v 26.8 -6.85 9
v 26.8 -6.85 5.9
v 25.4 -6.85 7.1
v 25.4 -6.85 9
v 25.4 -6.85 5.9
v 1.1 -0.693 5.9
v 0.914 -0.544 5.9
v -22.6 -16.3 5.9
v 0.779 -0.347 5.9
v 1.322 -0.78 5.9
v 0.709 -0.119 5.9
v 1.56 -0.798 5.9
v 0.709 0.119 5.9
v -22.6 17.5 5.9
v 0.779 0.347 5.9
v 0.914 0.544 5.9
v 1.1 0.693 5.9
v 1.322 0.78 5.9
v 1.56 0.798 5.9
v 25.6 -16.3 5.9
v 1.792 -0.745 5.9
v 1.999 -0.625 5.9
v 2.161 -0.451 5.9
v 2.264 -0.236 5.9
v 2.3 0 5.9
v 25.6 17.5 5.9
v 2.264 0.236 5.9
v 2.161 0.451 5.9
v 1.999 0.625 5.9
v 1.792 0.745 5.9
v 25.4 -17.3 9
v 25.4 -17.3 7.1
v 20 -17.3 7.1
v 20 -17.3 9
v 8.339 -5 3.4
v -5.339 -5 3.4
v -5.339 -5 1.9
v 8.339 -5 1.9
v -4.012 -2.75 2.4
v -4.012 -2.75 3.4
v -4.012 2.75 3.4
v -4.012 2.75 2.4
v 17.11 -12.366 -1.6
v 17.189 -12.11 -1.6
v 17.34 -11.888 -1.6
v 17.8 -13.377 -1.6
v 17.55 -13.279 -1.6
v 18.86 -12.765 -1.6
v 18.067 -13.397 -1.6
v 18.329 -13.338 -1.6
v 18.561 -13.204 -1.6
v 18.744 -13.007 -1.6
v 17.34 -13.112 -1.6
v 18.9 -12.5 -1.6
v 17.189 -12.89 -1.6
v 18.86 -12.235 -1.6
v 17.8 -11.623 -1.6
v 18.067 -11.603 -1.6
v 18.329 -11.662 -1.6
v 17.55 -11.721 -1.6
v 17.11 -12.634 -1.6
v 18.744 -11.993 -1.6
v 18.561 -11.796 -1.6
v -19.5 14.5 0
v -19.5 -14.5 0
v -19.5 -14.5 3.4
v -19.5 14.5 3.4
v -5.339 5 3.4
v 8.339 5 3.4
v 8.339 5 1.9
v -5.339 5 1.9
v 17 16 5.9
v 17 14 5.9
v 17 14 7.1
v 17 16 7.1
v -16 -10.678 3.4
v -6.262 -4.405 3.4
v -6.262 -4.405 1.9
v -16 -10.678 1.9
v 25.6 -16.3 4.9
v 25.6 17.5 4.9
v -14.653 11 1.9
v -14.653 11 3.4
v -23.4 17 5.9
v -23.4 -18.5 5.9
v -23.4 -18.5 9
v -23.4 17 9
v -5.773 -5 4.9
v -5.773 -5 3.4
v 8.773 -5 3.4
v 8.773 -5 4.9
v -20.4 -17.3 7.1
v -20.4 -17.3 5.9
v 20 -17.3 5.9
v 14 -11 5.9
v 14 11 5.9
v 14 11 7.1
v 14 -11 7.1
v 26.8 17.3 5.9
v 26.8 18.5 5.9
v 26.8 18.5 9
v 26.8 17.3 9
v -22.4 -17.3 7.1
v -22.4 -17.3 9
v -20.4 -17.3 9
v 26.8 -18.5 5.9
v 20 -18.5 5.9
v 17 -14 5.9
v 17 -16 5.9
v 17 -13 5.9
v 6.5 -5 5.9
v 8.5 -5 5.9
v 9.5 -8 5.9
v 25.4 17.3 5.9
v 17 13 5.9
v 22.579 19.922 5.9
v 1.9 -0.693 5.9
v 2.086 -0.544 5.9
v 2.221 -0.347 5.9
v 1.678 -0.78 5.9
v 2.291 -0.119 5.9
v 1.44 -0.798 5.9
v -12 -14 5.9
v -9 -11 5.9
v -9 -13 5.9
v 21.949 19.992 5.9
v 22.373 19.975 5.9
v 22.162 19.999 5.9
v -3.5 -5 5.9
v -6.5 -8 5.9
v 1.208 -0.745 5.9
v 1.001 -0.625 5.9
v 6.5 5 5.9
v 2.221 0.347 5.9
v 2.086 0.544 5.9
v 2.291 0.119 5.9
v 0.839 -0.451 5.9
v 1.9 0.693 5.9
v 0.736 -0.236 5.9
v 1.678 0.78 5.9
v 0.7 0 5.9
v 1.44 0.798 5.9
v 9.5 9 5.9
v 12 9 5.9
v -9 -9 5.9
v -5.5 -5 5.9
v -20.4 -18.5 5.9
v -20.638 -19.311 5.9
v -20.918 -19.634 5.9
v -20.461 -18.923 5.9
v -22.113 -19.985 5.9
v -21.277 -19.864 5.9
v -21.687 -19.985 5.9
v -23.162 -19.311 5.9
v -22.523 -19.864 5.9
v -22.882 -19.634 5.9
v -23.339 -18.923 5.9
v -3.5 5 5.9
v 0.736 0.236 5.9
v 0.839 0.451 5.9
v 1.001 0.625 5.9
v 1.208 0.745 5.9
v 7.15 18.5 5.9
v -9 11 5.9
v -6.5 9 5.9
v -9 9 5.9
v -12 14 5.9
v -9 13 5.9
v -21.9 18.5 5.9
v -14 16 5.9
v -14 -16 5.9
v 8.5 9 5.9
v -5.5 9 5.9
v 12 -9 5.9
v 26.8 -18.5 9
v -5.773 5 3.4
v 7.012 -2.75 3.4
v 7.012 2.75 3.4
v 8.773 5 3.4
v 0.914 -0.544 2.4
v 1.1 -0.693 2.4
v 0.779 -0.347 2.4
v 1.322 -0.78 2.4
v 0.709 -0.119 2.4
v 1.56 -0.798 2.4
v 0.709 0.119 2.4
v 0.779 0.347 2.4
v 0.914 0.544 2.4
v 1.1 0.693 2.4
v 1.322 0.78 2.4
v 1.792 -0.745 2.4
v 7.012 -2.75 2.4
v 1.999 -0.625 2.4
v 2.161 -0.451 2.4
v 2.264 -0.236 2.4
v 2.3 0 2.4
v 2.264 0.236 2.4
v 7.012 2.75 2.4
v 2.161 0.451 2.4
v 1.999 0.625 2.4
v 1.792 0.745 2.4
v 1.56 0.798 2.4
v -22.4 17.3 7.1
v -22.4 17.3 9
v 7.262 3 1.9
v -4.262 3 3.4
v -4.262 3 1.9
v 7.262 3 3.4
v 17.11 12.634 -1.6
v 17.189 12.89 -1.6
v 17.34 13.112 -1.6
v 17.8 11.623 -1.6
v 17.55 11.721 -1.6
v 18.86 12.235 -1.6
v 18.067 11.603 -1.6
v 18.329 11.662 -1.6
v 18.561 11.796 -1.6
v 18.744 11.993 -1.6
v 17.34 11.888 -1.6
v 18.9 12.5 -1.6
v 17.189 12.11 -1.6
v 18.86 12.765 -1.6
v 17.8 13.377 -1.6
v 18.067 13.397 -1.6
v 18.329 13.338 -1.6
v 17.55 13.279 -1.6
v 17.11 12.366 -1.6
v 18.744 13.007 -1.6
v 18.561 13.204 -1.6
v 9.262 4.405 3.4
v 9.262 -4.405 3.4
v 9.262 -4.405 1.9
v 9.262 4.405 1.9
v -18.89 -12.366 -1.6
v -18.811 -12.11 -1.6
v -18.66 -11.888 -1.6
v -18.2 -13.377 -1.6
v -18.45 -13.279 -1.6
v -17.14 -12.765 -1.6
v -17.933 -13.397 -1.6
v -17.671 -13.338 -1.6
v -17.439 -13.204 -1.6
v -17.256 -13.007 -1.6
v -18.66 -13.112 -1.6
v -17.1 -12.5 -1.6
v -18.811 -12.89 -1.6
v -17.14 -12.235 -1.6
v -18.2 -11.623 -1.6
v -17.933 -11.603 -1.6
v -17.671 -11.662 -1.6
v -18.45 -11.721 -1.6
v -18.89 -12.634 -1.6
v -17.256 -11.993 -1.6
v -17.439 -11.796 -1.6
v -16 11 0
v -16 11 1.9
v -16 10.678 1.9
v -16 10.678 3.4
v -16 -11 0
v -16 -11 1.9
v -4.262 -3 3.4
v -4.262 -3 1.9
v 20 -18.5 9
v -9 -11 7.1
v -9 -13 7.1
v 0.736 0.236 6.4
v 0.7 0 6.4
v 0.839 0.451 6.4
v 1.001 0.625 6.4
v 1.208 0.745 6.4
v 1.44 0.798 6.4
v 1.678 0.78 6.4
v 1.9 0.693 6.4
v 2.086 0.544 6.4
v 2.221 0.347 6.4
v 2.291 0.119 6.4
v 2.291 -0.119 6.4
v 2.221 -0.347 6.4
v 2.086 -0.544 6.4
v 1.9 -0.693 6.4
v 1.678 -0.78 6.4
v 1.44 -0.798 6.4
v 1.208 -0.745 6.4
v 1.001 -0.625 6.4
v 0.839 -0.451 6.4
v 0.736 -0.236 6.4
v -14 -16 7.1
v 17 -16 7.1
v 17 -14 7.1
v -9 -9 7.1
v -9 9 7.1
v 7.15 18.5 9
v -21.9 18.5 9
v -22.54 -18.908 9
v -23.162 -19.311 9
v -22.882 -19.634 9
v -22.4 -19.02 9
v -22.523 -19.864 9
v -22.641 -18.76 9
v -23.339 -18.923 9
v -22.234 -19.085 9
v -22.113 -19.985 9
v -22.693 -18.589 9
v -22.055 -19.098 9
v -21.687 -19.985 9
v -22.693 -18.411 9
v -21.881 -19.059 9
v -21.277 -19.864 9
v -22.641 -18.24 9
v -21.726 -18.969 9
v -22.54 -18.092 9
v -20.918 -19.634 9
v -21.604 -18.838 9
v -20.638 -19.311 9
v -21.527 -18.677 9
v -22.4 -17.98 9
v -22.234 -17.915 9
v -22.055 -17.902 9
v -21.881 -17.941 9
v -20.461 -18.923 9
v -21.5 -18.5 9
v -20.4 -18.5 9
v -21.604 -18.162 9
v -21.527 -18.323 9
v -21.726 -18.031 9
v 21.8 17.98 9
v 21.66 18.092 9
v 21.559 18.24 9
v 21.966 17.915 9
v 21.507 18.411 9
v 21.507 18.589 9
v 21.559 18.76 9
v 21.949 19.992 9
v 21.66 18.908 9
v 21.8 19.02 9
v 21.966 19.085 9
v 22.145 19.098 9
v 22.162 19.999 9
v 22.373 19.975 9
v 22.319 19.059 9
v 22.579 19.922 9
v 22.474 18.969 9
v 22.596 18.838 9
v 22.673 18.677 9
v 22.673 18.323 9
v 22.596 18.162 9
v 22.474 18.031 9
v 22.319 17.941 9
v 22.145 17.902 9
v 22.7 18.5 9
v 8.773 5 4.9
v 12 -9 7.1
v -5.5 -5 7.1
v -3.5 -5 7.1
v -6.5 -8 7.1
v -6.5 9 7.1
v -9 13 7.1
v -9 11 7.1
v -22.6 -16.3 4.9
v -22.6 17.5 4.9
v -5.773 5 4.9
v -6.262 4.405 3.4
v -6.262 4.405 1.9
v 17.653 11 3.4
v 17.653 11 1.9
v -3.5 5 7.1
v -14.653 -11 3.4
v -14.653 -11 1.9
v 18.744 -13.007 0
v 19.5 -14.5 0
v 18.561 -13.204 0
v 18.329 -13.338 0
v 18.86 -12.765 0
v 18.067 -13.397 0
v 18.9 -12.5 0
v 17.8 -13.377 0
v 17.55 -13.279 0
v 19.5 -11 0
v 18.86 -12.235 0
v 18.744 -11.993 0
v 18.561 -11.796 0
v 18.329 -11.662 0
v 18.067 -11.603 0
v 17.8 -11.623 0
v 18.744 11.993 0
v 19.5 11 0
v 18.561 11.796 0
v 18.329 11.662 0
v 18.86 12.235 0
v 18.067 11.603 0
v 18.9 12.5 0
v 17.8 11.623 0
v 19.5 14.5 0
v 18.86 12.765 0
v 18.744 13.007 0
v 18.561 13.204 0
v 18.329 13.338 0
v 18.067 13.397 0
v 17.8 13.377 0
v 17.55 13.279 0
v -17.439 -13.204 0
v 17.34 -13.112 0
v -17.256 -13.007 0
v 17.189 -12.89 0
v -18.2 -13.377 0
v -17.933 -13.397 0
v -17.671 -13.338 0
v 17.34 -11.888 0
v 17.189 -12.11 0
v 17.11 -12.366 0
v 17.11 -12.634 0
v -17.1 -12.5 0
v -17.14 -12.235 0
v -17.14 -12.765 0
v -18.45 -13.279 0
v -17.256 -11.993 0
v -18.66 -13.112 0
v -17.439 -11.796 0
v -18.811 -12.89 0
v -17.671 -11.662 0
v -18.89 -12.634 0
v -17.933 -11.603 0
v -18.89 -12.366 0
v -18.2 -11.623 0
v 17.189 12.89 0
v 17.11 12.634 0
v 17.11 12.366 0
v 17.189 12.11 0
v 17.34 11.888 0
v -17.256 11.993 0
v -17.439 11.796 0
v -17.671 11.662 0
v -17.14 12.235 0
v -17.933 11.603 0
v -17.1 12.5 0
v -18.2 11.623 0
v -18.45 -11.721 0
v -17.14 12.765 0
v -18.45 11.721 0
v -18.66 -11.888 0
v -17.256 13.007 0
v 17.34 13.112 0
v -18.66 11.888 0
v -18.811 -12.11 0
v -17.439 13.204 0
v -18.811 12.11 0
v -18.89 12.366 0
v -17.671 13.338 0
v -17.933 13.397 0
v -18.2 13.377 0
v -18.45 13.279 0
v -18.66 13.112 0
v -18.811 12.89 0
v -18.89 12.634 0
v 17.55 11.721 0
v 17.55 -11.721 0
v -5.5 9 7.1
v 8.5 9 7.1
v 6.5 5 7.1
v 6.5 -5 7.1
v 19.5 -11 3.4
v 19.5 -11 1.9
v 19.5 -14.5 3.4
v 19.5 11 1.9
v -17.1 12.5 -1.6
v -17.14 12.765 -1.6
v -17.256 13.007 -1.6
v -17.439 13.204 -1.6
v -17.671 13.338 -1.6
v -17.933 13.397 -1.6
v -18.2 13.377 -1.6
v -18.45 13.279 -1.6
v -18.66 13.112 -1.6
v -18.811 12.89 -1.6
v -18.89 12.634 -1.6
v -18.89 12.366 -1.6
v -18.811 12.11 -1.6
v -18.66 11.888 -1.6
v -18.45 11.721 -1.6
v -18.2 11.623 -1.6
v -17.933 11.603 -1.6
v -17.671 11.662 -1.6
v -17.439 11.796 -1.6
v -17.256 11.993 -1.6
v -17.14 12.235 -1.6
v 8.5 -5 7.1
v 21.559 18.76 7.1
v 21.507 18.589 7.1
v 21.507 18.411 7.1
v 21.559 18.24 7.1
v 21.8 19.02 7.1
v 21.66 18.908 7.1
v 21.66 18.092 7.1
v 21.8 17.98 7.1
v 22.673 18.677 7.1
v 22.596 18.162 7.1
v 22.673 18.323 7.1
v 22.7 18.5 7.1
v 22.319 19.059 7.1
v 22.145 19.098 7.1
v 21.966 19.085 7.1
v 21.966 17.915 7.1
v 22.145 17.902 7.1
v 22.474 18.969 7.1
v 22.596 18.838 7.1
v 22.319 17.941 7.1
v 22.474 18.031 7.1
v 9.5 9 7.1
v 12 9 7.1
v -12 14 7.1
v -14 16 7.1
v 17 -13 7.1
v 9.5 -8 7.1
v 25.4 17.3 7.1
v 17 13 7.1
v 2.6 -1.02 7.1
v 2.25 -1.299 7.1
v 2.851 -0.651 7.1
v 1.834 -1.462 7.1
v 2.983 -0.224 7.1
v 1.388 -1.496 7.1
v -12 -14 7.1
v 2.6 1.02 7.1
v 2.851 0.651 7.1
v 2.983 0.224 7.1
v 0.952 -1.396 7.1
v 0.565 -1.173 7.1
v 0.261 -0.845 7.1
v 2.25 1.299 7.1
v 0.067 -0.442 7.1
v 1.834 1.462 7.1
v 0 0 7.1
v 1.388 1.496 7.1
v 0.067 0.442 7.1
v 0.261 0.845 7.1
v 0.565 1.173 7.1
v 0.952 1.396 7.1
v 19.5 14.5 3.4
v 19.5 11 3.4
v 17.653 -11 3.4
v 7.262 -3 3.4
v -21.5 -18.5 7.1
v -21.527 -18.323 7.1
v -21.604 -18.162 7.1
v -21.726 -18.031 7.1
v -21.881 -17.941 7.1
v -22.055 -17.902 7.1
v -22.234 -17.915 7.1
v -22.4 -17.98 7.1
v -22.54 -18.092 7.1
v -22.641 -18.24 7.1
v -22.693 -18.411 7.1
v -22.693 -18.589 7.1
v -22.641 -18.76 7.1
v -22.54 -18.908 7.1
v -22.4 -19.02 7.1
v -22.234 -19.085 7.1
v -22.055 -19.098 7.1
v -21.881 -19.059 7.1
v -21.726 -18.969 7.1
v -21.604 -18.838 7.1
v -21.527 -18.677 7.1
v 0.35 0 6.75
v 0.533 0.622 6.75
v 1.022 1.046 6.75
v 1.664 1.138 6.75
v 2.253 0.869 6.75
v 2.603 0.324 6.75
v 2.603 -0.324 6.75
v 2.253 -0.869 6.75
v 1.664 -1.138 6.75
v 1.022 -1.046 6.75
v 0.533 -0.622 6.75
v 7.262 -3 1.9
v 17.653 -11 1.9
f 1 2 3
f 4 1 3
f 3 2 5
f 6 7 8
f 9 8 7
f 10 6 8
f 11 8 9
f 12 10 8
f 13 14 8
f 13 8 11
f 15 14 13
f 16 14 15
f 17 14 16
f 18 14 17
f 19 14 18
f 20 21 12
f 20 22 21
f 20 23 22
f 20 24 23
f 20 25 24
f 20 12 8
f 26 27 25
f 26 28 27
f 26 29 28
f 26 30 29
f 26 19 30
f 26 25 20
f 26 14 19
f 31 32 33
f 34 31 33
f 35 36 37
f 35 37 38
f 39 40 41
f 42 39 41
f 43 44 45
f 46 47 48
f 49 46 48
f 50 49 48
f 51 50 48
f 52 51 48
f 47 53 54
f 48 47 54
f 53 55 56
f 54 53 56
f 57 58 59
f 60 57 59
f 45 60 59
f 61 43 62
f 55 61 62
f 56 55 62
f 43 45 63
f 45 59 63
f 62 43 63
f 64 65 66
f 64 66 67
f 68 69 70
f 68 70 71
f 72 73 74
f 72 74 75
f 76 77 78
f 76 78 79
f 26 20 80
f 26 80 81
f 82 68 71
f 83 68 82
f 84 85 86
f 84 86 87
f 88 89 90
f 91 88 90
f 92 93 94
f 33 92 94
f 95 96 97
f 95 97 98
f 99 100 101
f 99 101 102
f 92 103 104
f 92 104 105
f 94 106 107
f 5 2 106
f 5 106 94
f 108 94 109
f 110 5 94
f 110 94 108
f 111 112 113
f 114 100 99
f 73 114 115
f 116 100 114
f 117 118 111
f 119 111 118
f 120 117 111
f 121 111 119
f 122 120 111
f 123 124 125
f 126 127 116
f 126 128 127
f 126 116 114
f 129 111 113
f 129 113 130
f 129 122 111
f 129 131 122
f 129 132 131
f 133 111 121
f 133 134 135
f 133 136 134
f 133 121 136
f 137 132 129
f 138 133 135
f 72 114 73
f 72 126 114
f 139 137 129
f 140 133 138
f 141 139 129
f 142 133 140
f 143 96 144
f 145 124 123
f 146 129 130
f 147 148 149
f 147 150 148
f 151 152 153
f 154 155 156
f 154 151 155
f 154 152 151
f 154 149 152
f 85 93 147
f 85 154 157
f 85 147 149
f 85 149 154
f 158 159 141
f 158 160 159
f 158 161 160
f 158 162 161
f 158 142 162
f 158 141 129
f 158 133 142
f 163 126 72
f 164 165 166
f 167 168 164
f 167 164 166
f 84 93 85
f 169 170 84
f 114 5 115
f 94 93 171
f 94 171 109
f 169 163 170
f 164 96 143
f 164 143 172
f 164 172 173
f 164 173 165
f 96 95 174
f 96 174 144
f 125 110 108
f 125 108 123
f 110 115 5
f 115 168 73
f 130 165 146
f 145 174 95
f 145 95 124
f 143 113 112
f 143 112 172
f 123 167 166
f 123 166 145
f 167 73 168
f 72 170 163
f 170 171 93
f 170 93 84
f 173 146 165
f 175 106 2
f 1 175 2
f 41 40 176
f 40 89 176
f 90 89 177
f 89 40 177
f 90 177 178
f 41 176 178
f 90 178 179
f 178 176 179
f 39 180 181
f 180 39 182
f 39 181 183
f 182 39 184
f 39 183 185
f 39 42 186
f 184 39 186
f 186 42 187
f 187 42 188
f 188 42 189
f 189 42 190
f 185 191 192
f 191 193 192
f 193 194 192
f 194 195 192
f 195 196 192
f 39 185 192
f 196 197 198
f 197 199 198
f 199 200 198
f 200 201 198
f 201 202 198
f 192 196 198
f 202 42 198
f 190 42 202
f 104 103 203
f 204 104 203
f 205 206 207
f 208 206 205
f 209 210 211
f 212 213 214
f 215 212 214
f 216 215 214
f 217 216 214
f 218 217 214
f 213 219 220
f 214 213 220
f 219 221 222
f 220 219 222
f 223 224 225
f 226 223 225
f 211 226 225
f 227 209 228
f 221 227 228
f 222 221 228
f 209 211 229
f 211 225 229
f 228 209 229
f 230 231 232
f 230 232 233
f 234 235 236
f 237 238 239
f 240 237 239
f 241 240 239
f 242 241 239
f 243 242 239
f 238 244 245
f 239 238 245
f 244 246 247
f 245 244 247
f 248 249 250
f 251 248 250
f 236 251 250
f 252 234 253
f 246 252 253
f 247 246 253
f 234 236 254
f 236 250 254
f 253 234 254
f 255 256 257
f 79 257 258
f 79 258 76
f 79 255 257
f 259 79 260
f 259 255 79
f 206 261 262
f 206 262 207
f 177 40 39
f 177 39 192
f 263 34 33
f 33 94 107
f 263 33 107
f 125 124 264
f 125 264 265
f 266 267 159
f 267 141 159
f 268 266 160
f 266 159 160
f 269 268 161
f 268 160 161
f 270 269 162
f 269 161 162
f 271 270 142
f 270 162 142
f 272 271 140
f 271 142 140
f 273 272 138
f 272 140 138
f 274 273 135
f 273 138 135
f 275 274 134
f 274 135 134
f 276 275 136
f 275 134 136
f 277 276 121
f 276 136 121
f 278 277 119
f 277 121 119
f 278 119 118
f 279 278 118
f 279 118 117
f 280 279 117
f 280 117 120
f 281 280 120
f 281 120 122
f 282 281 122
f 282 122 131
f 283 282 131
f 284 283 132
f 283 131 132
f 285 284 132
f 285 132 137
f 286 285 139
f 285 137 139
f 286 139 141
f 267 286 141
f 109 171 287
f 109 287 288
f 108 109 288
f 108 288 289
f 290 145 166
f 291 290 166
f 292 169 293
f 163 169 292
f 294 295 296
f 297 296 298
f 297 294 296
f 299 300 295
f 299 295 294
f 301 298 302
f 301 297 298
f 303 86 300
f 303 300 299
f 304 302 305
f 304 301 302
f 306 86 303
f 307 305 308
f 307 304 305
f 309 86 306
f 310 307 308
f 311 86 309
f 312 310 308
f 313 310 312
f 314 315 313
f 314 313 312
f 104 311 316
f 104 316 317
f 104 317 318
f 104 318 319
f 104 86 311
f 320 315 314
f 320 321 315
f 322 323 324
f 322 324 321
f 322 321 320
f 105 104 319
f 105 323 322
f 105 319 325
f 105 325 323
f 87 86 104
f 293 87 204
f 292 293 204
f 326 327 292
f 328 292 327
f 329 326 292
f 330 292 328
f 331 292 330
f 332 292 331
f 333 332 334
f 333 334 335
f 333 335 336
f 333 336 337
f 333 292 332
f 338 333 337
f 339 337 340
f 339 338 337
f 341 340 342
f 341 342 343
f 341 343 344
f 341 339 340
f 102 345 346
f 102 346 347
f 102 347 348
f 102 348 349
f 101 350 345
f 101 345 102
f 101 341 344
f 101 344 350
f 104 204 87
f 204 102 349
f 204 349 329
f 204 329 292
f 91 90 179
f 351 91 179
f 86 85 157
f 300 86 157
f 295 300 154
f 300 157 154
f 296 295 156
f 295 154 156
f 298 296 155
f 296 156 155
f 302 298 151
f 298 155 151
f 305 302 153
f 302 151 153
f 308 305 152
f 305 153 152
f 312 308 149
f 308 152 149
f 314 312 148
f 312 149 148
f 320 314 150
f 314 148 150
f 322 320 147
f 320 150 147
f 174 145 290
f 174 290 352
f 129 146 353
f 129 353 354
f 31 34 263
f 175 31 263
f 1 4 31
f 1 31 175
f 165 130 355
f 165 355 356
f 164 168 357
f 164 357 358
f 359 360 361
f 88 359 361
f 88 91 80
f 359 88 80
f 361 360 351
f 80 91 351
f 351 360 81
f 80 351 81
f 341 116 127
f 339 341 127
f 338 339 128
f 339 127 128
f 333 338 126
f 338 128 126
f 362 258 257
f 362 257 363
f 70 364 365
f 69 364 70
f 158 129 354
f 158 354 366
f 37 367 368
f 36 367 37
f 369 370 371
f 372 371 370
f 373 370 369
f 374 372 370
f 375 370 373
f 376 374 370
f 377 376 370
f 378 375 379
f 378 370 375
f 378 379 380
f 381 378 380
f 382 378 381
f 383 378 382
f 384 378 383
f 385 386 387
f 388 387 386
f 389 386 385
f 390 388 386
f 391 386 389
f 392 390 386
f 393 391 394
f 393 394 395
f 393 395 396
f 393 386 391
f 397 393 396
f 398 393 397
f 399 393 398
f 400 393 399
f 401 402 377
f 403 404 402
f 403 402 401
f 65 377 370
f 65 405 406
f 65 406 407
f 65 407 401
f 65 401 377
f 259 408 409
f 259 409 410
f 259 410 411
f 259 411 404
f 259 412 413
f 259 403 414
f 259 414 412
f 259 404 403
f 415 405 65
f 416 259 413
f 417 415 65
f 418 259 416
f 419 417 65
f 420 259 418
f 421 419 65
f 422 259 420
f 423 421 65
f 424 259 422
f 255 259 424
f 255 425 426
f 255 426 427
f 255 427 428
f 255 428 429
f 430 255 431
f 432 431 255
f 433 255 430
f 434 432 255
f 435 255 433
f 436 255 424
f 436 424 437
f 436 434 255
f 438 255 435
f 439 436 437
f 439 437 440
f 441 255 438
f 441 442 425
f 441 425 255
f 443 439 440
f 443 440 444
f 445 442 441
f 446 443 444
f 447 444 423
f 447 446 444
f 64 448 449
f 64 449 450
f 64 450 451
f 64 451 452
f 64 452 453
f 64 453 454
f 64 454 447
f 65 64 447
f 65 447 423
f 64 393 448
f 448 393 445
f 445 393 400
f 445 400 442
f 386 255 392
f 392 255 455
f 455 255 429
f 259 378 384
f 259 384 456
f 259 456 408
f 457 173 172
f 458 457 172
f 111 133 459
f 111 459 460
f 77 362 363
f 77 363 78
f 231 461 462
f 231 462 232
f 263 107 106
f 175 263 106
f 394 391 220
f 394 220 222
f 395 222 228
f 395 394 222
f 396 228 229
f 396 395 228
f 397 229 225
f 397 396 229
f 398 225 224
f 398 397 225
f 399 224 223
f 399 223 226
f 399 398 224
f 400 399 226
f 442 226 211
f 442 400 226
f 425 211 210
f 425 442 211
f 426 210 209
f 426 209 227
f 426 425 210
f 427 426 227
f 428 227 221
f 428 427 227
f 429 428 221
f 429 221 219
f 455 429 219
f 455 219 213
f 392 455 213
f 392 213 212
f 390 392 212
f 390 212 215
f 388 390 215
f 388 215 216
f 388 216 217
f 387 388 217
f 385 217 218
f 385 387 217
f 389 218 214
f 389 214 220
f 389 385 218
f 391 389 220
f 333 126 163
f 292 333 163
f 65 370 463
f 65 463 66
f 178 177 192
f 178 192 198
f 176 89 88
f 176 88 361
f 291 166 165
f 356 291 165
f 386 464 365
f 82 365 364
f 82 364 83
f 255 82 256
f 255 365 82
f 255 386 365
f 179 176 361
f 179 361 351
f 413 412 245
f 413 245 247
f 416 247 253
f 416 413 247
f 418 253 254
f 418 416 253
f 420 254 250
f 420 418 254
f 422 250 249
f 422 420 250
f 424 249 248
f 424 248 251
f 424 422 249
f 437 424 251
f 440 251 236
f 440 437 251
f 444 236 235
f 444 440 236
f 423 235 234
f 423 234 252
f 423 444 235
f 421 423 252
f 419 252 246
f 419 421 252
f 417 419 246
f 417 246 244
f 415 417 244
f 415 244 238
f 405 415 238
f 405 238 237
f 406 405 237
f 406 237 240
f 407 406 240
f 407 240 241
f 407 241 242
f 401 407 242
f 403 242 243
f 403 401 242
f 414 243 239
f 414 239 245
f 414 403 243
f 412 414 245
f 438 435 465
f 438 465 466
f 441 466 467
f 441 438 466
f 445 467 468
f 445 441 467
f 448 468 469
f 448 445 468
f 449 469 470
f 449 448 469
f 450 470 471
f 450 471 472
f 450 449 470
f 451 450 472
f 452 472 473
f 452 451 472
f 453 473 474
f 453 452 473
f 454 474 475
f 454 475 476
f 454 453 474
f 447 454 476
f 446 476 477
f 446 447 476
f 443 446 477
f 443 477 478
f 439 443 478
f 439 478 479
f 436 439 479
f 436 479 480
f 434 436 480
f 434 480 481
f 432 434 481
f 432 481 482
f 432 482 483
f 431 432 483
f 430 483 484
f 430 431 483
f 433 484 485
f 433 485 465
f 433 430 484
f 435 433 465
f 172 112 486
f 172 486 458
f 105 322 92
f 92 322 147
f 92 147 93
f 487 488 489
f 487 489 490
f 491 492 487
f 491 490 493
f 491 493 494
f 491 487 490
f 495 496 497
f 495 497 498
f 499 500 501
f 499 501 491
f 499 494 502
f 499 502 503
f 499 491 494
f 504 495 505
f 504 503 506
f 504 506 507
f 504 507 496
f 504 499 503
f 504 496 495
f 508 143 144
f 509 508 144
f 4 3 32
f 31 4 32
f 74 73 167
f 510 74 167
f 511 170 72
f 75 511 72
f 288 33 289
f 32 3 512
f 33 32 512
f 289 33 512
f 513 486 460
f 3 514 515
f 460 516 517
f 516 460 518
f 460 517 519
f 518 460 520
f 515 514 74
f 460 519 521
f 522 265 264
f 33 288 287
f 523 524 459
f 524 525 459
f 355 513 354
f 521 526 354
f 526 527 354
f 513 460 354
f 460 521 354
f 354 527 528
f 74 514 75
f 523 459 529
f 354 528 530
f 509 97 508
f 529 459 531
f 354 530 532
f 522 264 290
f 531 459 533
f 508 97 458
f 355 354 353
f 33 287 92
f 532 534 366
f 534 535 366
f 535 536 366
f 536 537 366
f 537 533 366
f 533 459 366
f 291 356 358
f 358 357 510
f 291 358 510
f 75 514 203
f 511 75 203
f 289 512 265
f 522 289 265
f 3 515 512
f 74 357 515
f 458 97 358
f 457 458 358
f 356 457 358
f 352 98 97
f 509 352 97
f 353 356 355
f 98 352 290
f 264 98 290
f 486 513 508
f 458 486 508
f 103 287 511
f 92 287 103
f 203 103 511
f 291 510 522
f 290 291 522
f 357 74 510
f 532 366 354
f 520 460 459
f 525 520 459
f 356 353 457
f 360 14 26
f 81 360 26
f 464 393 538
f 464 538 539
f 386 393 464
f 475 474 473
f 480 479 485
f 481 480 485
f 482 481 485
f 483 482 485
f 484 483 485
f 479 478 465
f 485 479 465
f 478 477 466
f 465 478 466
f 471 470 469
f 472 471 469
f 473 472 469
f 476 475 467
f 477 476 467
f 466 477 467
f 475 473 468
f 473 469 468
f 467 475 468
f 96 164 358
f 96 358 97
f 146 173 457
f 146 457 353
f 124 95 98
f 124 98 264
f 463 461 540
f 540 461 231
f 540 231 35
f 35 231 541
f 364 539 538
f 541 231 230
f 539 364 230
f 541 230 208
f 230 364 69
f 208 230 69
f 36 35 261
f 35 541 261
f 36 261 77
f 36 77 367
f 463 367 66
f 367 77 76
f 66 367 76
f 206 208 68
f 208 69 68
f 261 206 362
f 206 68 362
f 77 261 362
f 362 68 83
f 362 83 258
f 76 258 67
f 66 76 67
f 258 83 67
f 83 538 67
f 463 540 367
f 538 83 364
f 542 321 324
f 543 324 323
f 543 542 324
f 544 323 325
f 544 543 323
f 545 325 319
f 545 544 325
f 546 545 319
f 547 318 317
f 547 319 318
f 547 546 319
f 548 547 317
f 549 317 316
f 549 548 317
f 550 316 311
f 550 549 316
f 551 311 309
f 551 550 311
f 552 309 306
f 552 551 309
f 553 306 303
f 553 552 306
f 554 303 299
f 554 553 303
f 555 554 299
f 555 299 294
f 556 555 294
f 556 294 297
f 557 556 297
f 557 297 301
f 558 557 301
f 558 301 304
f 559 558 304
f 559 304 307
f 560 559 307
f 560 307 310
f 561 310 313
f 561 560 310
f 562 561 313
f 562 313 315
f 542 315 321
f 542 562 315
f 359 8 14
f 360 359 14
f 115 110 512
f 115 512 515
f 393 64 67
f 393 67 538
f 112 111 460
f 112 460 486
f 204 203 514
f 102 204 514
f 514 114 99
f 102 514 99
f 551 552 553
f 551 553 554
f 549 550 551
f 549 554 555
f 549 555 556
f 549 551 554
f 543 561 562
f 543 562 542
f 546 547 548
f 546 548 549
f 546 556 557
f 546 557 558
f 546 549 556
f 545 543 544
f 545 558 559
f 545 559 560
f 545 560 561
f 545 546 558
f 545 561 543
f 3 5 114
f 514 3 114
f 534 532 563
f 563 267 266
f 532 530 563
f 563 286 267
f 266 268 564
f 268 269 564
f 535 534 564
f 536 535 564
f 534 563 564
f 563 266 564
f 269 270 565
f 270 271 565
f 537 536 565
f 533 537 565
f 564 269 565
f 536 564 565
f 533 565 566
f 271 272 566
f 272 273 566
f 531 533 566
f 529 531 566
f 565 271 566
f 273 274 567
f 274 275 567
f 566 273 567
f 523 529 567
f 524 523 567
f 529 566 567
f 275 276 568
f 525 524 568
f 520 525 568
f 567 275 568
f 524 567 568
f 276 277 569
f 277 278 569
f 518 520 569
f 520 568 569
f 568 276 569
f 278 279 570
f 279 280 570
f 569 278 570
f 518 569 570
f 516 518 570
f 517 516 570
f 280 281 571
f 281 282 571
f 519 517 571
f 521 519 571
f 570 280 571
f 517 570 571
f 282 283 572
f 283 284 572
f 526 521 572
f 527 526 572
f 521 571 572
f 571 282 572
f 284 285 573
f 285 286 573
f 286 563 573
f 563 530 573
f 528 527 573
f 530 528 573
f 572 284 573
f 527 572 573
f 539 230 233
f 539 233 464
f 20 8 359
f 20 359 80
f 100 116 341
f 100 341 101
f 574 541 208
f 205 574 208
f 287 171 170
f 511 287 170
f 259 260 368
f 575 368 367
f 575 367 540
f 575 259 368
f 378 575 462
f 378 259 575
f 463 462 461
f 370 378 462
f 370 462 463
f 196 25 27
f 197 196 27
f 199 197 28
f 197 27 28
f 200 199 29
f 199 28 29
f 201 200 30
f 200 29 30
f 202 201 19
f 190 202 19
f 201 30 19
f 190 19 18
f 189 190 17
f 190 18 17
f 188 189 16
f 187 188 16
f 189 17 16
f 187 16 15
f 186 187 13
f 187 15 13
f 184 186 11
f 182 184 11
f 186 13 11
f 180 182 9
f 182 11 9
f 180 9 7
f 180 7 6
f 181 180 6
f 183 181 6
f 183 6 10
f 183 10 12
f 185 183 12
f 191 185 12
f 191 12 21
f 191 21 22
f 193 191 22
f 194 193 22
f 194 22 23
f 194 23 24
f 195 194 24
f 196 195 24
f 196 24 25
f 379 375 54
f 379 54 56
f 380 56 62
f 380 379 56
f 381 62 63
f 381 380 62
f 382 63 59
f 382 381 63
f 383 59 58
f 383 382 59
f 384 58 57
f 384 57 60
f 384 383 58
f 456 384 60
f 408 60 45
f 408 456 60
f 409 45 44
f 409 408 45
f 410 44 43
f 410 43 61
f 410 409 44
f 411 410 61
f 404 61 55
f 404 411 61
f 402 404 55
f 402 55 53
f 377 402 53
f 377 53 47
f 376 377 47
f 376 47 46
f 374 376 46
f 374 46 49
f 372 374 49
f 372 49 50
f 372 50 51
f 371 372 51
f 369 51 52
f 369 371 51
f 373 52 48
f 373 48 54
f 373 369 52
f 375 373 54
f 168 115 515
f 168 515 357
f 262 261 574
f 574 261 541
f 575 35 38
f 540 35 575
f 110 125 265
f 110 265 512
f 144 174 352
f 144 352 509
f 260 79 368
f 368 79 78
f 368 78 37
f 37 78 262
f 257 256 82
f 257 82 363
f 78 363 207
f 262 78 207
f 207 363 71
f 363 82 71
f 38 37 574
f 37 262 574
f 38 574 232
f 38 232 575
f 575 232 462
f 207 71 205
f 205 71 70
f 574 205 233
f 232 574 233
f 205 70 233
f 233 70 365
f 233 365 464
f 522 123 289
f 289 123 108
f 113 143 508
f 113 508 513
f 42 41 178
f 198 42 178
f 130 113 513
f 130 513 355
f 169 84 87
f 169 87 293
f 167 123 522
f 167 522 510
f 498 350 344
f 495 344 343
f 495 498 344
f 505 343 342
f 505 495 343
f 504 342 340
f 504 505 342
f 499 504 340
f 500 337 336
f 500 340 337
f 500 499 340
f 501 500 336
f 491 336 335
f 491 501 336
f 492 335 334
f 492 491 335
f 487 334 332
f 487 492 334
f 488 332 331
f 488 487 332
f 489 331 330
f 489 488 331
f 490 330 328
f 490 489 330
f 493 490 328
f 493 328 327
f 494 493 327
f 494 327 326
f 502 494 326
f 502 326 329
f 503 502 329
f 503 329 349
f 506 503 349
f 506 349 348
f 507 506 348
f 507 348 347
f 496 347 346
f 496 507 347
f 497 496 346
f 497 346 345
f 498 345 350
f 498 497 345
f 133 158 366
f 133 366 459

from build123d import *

# Parameters (mm, degrees)
SKETCH007_W      = 47.8
SKETCH007_H      = 34.6
PAD005_DEPTH     = 1.2
PAD006_DEPTH     = 3.1
SKETCH005_W      = 31
SKETCH005_H      = 32
POCKET002_DEPTH  = 5
SKETCH023_W      = 21
SKETCH023_H      = 18
PAD_DEPTH        = 1.2
PAD015_DEPTH     = 1.2
SKETCH013_R      = 0.6
POCKET_DEPTH     = 5
HOLE_D           = 1.6
HOLE_DEPTH       = 25
HOLE_CSINK_D     = 3
HOLE_CSINK_ANGLE = 90
PAD019_DEPTH     = 3.4
SKETCH_R         = 0.9
PAD020_DEPTH     = 1.6
SKETCH037_W      = 11.524262
SKETCH037_H      = 6
PAD021_DEPTH     = 1.5
SKETCH036_W      = 11.0243
SKETCH036_H      = 5.5
PAD022_DEPTH     = 1
SKETCH038_W      = 14.5455
SKETCH038_H      = 10
PAD023_DEPTH     = 1.8
SKETCH039_W      = 48.2
SKETCH039_H      = 33.8
PAD024_DEPTH     = 1
SKETCH040_R      = 0.8
POCKET007_DEPTH  = 5


with BuildPart() as plastic_tek1_display_interface_top_part:
    # Sketch007 (on DatumPlane) → Pad005 (new body)
    with BuildSketch(Plane.XY.offset(5.9)):
        with Locations((1.5, 0)):
            Rectangle(SKETCH007_W, SKETCH007_H)
    extrude(amount=PAD005_DEPTH)

    # Sketch008 (on DatumPlane) → Pad006 (join)
    with BuildSketch(Plane.XY.offset(5.9)):
        with BuildLine():
            Line((-22.4, -17.3), (-22.4, 17.3))
            Line((-22.4, 17.3), (-17.7, 17.3))
            Line((-17.7, 17.3), (-17.3, 17.3))
            Line((-17.3, 17.3), (17.3, 17.3))
            Line((17.3, 17.3), (17.7, 17.3))
            Line((17.7, 17.3), (25.4, 17.3))
            Line((25.4, 17.3), (26.8, 17.3))
            Line((26.8, 18.5), (26.8, 17.3))
            Line((22.578723, 19.921557), (26.8, 18.5))
            ThreePointArc((22.578723, 19.921557), (22.267893, 19.990574), (21.949498, 19.992431))
            Line((21.949498, 19.992431), (7.15, 18.5))
            Line((-21.9, 18.5), (7.15, 18.5))
            Line((-23.4, 17), (-21.9, 18.5))
            Line((-23.4, -18.5), (-23.4, 17))
            ThreePointArc((-23.4, -18.5), (-21.9, -20), (-20.4, -18.5))
            Line((-20.4, -18.5), (-20.4, -17.3))
            Line((-21.3, -17.3), (-20.4, -17.3))
            Line((-21.7, -17.3), (-21.3, -17.3))
            Line((-22.4, -17.3), (-21.7, -17.3))
        make_face()
        Polygon((20, -18.5), (26.8, -18.5), (26.8, -6.85), (25.4, -6.85), (25.4, -17.3), (21.7, -17.3), (21.3, -17.3), (20, -17.3), align=None)
    extrude(amount=PAD006_DEPTH)

    # Sketch005 (on DatumPlane) → Pocket002 (cut)
    with BuildSketch(Plane.XY.offset(5.9)):
        with Locations((1.5, 0)):
            Rectangle(SKETCH005_W, SKETCH005_H)
    extrude(amount=POCKET002_DEPTH, mode=Mode.SUBTRACT)

    # Sketch023 (on DatumPlane) → Pad (join)
    with BuildSketch(Plane.XY.offset(5.9)):
        Polygon((-12, -14), (-12, 14), (-9, 14), (17, 14), (17, 13), (-9, 13), (-9, 11), (14, 11), (14, -11), (-9, -11), (-9, -13), (17, -13), (17, -14), (-9, -14), align=None)
        with Locations((1.5, 0)):
            Rectangle(SKETCH023_W, SKETCH023_H, mode=Mode.SUBTRACT)
    extrude(amount=PAD_DEPTH)

    # Sketch020 (on DatumPlane) → Pad015 (join)
    with BuildSketch(Plane.XY.offset(5.9)):
        Polygon((-3.5, -5), (-3.5, 5), (6.5, 5), (6.5, -5), (8.5, -5), (8.5, 10), (9.5, 10), (9.5, -8), (-6.5, -8), (-6.5, 10), (-5.5, 10), (-5.5, -5), align=None)
    extrude(amount=PAD015_DEPTH)

    # Sketch013 (on DatumPlane) → Pocket (cut)
    with BuildSketch(Plane.XY.offset(7.1)):
        with Locations((22.1, 18.5)):
            Circle(SKETCH013_R)
        with Locations((-22.1, -18.5)):
            Circle(SKETCH013_R)
    extrude(amount=POCKET_DEPTH, mode=Mode.SUBTRACT)

    # Hole
    with Locations(Plane.XY.offset(7.1)):
        with Locations((1.5, 0)):
            CounterSinkHole(HOLE_D / 2, HOLE_CSINK_D / 2, depth=HOLE_DEPTH, counter_sink_angle=HOLE_CSINK_ANGLE)


with BuildPart() as body002:
    # Sketch029 → Pad019 (new body)
    with BuildSketch(Plane.XY):
        Polygon((-19.5, -14.5), (-19.5, 14.5), (19.5, 14.5), (19.5, 11), (-16, 11), (-16, -11), (19.5, -11), (19.5, -14.5), align=None)
    extrude(amount=PAD019_DEPTH)

    # Sketch → Pad020 (join)
    with BuildSketch(Plane.XY):
        with Locations((-18, 12.5)):
            Circle(SKETCH_R)
        with Locations((-18, -12.5)):
            Circle(SKETCH_R)
        with Locations((18, -12.5)):
            Circle(SKETCH_R)
        with Locations((18, 12.5)):
            Circle(SKETCH_R)
    extrude(amount=-PAD020_DEPTH)

    # Sketch037 (on DatumPlane) → Pad021 (join)
    with BuildSketch(Plane.XY.offset(3.4)):
        Polygon((-16.5, 11), (-6.262131, 4.405245), (-6.262131, -4.405245), (-16.5, -11), (-14.653374, -11), (-5.338818, -5), (8.338818, -5), (17.653374, -11), (19.5, -11), (9.262131, -4.405245), (9.262131, 4.405245), (19.5, 11), (17.653374, 11), (8.338818, 5), (-5.338818, 5), (-14.653374, 11), align=None)
        with Locations((1.5, 0)):
            Rectangle(SKETCH037_W, SKETCH037_H, mode=Mode.SUBTRACT)
    extrude(amount=-PAD021_DEPTH)


with BuildPart() as body:
    # Sketch036 (on DatumPlane) → Pad022 (new body)
    with BuildSketch(Plane.XY.offset(3.4)):
        with Locations((1.5, 0)):
            Rectangle(SKETCH036_W, SKETCH036_H)
    extrude(amount=-PAD022_DEPTH)

    # Sketch038 (on DatumPlane) → Pad023 (join)
    with BuildSketch(Plane.XY.offset(3.4)):
        with Locations((1.5, 0)):
            Rectangle(SKETCH038_W, SKETCH038_H)
    extrude(amount=PAD023_DEPTH)

    # Sketch039 (on DatumPlane) → Pad024 (join)
    with BuildSketch(Plane.XY.offset(5.9)):
        with Locations((1.5, 0.6)):
            Rectangle(SKETCH039_W, SKETCH039_H)
    extrude(amount=-PAD024_DEPTH)

    # Sketch040 (on DatumPlane) → Pocket007 (cut)
    with BuildSketch(Plane.XY.offset(5.9)):
        with Locations((1.5, 0)):
            Circle(SKETCH040_R)
    extrude(amount=-POCKET007_DEPTH, mode=Mode.SUBTRACT)


solid = Compound([plastic_tek1_display_interface_top_part.part, body002.part, body.part])
